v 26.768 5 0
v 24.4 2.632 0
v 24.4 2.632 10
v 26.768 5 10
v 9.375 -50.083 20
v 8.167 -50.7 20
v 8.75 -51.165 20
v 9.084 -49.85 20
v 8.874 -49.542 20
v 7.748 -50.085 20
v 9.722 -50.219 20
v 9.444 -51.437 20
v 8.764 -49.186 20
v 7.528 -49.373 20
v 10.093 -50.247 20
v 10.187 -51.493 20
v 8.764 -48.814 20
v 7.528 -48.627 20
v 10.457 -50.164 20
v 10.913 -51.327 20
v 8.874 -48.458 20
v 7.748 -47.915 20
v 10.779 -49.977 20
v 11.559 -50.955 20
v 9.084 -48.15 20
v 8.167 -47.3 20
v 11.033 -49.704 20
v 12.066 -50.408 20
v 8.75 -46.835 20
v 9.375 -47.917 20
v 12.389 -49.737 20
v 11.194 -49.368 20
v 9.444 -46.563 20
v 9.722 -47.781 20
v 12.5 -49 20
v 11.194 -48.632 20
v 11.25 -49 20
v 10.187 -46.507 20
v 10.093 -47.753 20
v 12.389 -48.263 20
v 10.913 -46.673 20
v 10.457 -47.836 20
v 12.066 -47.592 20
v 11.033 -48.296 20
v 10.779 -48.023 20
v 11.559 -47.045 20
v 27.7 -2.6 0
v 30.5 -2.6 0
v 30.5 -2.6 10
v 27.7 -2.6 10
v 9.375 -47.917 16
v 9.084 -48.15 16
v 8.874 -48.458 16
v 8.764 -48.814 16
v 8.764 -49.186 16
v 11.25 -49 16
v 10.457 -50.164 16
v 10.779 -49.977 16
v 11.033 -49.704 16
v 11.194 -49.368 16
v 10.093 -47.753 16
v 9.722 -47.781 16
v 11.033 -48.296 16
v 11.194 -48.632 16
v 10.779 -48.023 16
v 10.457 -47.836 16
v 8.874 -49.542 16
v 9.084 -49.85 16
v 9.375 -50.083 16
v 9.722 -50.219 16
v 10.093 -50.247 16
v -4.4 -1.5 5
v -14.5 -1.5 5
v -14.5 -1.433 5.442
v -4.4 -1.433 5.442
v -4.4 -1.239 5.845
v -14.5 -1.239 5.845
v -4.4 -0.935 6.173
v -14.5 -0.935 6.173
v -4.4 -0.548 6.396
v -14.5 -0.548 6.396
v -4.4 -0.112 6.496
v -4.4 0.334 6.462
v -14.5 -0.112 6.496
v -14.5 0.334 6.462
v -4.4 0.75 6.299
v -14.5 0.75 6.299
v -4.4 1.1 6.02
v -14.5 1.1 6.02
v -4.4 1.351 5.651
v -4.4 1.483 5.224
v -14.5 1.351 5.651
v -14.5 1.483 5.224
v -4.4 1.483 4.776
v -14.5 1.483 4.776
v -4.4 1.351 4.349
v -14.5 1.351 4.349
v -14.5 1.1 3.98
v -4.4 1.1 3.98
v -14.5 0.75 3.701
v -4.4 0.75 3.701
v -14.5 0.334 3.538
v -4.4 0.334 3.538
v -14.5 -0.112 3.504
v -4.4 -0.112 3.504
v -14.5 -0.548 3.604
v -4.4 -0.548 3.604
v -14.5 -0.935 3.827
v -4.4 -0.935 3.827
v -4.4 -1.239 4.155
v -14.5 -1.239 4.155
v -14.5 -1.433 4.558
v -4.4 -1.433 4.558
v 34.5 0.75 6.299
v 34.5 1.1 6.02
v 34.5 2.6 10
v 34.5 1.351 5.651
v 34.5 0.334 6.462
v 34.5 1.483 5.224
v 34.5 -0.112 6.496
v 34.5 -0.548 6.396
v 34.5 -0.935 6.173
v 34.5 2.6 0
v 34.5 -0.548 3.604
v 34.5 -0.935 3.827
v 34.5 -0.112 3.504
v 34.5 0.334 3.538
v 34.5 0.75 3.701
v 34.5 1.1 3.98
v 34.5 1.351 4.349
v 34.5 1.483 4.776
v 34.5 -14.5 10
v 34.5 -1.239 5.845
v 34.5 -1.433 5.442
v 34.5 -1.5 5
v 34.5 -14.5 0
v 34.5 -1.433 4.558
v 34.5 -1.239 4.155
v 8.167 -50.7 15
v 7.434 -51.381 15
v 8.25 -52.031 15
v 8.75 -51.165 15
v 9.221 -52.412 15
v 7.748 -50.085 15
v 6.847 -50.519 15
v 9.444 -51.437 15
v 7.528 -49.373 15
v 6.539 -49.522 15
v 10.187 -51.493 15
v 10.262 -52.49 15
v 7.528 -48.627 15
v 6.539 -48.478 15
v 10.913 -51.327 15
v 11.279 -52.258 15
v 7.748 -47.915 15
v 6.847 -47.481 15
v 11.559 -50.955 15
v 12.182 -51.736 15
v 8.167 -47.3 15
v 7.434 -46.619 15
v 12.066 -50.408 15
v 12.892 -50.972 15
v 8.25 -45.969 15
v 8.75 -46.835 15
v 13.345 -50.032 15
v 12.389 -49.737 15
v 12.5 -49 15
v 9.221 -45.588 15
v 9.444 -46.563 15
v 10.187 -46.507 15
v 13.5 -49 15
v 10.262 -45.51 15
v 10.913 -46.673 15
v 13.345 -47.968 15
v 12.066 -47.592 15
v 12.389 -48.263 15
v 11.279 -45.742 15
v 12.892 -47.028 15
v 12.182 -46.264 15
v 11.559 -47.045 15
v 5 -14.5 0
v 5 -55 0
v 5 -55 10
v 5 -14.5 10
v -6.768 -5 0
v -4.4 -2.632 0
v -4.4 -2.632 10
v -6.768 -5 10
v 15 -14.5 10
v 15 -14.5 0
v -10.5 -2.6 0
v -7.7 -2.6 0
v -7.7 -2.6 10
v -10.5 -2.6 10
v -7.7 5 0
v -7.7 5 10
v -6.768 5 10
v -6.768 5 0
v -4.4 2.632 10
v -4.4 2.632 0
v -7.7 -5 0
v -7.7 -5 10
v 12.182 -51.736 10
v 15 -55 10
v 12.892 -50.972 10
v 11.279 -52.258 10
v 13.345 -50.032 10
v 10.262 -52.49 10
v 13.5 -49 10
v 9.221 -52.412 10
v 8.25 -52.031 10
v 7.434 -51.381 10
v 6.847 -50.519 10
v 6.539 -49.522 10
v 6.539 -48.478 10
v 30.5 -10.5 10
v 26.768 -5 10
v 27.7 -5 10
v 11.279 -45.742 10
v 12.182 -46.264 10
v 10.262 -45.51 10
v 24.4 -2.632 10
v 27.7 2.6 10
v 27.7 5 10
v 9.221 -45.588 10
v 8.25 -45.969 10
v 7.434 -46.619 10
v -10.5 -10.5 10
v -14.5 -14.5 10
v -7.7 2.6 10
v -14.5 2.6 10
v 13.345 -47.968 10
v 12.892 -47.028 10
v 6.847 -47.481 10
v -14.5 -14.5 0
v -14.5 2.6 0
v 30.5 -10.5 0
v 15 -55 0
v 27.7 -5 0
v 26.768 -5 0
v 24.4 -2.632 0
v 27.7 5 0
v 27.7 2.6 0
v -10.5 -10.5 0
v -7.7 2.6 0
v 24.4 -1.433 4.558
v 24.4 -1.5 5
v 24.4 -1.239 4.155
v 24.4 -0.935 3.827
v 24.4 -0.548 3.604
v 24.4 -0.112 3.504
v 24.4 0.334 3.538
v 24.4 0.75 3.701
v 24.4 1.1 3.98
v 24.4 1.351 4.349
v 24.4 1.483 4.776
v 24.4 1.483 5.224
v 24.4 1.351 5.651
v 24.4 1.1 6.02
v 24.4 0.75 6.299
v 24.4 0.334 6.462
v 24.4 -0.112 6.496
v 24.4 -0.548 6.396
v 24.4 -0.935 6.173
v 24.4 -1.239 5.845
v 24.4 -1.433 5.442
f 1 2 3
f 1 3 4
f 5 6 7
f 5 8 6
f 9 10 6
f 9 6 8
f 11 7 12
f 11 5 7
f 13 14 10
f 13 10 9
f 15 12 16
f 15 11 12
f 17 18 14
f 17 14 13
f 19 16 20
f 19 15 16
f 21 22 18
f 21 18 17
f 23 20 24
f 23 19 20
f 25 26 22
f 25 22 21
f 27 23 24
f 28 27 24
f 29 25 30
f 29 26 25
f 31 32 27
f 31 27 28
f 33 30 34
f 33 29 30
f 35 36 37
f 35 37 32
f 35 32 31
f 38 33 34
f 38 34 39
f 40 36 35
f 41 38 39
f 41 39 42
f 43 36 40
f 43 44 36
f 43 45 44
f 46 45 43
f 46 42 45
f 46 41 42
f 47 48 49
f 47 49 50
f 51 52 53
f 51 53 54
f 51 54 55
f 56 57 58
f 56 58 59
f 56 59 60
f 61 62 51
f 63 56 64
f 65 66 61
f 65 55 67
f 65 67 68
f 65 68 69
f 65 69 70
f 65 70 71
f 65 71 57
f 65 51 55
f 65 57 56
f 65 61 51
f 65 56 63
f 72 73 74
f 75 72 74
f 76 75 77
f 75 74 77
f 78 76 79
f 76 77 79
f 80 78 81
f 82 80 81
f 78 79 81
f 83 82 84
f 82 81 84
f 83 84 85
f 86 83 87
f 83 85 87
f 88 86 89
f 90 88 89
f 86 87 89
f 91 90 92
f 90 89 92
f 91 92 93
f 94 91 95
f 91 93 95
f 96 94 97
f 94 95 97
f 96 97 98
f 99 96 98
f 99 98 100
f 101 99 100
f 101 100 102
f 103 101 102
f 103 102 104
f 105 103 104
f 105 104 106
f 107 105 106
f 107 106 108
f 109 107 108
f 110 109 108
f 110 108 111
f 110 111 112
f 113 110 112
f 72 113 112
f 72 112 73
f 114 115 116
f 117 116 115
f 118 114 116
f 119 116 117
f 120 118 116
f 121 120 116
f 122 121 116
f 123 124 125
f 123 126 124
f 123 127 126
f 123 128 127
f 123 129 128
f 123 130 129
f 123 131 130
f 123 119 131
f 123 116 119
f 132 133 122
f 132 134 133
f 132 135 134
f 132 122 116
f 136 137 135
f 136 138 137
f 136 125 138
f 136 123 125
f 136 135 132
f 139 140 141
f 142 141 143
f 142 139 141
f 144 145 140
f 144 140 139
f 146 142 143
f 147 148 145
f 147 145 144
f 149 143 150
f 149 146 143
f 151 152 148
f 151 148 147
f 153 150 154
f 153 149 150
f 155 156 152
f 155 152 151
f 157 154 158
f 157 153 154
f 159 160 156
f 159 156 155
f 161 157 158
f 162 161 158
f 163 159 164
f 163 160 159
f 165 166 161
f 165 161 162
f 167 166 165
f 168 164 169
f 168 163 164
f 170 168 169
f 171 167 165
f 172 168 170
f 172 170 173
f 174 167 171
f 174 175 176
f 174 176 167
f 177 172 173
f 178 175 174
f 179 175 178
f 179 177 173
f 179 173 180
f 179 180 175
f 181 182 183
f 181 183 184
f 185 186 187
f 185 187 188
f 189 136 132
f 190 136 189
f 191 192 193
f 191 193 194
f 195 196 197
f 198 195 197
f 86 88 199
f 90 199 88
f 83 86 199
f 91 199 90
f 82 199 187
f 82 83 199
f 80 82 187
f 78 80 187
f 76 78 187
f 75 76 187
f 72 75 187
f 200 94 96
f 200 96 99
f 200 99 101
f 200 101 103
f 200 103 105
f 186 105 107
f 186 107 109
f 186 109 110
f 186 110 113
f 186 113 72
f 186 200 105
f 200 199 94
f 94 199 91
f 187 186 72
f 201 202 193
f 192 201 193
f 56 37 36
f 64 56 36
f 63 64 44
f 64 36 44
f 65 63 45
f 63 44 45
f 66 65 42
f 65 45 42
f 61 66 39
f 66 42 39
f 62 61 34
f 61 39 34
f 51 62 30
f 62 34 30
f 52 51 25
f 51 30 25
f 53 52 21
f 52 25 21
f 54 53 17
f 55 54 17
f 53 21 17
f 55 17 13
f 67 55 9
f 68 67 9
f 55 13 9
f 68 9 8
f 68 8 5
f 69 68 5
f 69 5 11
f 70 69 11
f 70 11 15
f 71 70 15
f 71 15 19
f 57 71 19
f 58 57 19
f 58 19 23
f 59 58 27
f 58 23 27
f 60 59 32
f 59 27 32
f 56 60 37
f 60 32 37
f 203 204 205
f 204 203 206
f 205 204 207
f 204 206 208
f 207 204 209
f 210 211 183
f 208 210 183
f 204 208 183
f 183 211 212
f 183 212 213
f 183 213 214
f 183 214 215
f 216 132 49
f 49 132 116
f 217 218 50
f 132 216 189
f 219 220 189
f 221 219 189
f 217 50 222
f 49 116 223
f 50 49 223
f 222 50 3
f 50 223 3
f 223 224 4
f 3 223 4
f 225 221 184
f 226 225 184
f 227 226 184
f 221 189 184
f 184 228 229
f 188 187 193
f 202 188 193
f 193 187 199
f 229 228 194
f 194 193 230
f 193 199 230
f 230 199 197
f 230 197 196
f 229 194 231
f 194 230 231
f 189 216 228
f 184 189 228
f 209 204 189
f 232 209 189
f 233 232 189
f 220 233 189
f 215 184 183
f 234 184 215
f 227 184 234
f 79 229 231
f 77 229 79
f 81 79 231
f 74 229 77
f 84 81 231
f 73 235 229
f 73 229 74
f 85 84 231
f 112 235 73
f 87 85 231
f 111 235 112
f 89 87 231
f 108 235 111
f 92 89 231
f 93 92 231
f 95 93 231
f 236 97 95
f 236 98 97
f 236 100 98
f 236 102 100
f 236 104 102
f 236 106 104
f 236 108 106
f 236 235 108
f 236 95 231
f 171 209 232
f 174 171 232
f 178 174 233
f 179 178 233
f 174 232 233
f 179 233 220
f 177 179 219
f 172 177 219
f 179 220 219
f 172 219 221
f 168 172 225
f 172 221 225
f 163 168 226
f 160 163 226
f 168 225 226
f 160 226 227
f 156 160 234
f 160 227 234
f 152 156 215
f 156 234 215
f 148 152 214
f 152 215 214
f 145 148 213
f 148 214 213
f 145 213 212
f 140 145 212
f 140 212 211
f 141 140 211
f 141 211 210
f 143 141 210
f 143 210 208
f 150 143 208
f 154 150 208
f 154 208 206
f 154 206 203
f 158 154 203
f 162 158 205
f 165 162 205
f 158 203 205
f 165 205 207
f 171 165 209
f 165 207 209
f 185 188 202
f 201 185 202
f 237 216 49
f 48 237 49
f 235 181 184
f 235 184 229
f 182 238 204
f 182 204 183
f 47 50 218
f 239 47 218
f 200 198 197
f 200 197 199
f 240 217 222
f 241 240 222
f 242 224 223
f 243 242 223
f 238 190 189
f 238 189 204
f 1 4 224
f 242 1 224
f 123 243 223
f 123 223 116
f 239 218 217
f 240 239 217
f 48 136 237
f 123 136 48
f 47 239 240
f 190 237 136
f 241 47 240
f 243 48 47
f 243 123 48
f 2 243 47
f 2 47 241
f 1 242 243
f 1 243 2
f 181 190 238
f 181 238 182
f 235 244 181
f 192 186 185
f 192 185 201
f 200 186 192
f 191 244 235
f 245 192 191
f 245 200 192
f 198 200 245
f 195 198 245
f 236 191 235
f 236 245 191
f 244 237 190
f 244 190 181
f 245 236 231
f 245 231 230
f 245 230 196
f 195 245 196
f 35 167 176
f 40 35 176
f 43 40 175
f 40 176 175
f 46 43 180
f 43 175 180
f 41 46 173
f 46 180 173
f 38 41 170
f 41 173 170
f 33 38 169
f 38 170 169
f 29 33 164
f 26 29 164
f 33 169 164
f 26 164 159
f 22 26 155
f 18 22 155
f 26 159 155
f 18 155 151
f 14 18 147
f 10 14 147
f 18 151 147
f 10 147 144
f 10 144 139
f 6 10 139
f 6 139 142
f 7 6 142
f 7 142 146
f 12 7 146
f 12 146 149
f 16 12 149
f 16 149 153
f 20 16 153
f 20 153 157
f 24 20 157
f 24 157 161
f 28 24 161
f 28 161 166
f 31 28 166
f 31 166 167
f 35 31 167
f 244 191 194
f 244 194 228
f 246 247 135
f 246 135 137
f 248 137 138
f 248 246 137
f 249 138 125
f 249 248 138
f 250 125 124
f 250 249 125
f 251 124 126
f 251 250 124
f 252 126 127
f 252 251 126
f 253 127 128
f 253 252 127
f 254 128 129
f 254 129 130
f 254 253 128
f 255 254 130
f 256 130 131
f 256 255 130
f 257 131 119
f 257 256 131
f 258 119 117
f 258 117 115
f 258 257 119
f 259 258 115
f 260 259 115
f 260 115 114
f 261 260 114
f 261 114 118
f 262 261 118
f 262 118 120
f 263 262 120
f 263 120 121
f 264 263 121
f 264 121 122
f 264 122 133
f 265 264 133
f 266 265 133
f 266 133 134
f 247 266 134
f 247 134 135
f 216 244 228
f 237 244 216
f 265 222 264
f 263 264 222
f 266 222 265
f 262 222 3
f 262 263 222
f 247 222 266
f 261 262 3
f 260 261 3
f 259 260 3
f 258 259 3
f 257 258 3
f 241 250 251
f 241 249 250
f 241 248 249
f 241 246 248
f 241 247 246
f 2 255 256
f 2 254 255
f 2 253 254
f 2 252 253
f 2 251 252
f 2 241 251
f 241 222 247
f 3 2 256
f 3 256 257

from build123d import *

# Parameters (mm, degrees)
BOSS_EXTRUDE1_DEPTH = 10
SKETCH2_R           = 1.5
CUT_EXTRUDE1_DEPTH  = 13
CUT_EXTRUDE2_START  = -13
SKETCH3_R           = 1.5
CUT_EXTRUDE2_DEPTH  = 13
SKETCH4_R           = 2.5
BOSS_EXTRUDE2_DEPTH = 10
SKETCH5_R           = 3.5
BOSS_EXTRUDE3_DEPTH = 5
SKETCH6_R           = 1.25
CUT_EXTRUDE3_DEPTH  = 4


with BuildPart() as part:
    # Sketch1 → Boss-Extrude1 (new body)
    with BuildSketch(Plane.XY):
        Polygon((-14.5, 2.6), (-7.7, 2.6), (-7.7, 5), (-6.767766953, 5), (-4.4, 2.632233047), (-4.4, -2.632233047), (-6.767766953, -5), (-7.7, -5), (-7.7, -2.6), (-10.5, -2.6), (-10.5, -10.5), (30.5, -10.5), (30.5, -2.6), (27.7, -2.6), (27.7, -5), (26.767766953, -5), (24.4, -2.632233047), (24.4, 2.632233047), (26.767766953, 5), (27.7, 5), (27.7, 2.6), (34.5, 2.6), (34.5, -14.5), (15, -14.5), (15, -55), (5, -55), (5, -14.5), (-14.5, -14.5), align=None)
    extrude(amount=BOSS_EXTRUDE1_DEPTH)

    # Sketch2 → Cut-Extrude1 (cut)
    with BuildSketch(Plane.ZY.offset(14.5)):
        with Locations(Location((5, 0, 0), (0, 0, 270))):
            Circle(SKETCH2_R)
    extrude(amount=-CUT_EXTRUDE1_DEPTH, mode=Mode.SUBTRACT)

    # Sketch3 → Cut-Extrude2 (cut)
    with BuildSketch(Plane(origin=(34.5, 0, 0), x_dir=(0, 0, -1), z_dir=(1, 0, 0)).offset(CUT_EXTRUDE2_START)):
        with Locations(Location((-5, 0, 0), (0, 0, 270))):
            Circle(SKETCH3_R)
    extrude(amount=CUT_EXTRUDE2_DEPTH, mode=Mode.SUBTRACT)

    # Sketch4 → Boss-Extrude2 (add)
    with BuildSketch(Plane.XY.offset(10)):
        with Locations((10, -49)):
            Circle(SKETCH4_R)
    extrude(amount=BOSS_EXTRUDE2_DEPTH)

    # Sketch5 → Boss-Extrude3 (add)
    with BuildSketch(Plane.XY.offset(10)):
        with Locations((10, -49)):
            Circle(SKETCH5_R)
    extrude(amount=BOSS_EXTRUDE3_DEPTH)

    # Sketch6 → Cut-Extrude3 (cut)
    with BuildSketch(Plane.XY.offset(20)):
        with Locations((10, -49)):
            Circle(SKETCH6_R)
    extrude(amount=-CUT_EXTRUDE3_DEPTH, mode=Mode.SUBTRACT)


solid = part.part
